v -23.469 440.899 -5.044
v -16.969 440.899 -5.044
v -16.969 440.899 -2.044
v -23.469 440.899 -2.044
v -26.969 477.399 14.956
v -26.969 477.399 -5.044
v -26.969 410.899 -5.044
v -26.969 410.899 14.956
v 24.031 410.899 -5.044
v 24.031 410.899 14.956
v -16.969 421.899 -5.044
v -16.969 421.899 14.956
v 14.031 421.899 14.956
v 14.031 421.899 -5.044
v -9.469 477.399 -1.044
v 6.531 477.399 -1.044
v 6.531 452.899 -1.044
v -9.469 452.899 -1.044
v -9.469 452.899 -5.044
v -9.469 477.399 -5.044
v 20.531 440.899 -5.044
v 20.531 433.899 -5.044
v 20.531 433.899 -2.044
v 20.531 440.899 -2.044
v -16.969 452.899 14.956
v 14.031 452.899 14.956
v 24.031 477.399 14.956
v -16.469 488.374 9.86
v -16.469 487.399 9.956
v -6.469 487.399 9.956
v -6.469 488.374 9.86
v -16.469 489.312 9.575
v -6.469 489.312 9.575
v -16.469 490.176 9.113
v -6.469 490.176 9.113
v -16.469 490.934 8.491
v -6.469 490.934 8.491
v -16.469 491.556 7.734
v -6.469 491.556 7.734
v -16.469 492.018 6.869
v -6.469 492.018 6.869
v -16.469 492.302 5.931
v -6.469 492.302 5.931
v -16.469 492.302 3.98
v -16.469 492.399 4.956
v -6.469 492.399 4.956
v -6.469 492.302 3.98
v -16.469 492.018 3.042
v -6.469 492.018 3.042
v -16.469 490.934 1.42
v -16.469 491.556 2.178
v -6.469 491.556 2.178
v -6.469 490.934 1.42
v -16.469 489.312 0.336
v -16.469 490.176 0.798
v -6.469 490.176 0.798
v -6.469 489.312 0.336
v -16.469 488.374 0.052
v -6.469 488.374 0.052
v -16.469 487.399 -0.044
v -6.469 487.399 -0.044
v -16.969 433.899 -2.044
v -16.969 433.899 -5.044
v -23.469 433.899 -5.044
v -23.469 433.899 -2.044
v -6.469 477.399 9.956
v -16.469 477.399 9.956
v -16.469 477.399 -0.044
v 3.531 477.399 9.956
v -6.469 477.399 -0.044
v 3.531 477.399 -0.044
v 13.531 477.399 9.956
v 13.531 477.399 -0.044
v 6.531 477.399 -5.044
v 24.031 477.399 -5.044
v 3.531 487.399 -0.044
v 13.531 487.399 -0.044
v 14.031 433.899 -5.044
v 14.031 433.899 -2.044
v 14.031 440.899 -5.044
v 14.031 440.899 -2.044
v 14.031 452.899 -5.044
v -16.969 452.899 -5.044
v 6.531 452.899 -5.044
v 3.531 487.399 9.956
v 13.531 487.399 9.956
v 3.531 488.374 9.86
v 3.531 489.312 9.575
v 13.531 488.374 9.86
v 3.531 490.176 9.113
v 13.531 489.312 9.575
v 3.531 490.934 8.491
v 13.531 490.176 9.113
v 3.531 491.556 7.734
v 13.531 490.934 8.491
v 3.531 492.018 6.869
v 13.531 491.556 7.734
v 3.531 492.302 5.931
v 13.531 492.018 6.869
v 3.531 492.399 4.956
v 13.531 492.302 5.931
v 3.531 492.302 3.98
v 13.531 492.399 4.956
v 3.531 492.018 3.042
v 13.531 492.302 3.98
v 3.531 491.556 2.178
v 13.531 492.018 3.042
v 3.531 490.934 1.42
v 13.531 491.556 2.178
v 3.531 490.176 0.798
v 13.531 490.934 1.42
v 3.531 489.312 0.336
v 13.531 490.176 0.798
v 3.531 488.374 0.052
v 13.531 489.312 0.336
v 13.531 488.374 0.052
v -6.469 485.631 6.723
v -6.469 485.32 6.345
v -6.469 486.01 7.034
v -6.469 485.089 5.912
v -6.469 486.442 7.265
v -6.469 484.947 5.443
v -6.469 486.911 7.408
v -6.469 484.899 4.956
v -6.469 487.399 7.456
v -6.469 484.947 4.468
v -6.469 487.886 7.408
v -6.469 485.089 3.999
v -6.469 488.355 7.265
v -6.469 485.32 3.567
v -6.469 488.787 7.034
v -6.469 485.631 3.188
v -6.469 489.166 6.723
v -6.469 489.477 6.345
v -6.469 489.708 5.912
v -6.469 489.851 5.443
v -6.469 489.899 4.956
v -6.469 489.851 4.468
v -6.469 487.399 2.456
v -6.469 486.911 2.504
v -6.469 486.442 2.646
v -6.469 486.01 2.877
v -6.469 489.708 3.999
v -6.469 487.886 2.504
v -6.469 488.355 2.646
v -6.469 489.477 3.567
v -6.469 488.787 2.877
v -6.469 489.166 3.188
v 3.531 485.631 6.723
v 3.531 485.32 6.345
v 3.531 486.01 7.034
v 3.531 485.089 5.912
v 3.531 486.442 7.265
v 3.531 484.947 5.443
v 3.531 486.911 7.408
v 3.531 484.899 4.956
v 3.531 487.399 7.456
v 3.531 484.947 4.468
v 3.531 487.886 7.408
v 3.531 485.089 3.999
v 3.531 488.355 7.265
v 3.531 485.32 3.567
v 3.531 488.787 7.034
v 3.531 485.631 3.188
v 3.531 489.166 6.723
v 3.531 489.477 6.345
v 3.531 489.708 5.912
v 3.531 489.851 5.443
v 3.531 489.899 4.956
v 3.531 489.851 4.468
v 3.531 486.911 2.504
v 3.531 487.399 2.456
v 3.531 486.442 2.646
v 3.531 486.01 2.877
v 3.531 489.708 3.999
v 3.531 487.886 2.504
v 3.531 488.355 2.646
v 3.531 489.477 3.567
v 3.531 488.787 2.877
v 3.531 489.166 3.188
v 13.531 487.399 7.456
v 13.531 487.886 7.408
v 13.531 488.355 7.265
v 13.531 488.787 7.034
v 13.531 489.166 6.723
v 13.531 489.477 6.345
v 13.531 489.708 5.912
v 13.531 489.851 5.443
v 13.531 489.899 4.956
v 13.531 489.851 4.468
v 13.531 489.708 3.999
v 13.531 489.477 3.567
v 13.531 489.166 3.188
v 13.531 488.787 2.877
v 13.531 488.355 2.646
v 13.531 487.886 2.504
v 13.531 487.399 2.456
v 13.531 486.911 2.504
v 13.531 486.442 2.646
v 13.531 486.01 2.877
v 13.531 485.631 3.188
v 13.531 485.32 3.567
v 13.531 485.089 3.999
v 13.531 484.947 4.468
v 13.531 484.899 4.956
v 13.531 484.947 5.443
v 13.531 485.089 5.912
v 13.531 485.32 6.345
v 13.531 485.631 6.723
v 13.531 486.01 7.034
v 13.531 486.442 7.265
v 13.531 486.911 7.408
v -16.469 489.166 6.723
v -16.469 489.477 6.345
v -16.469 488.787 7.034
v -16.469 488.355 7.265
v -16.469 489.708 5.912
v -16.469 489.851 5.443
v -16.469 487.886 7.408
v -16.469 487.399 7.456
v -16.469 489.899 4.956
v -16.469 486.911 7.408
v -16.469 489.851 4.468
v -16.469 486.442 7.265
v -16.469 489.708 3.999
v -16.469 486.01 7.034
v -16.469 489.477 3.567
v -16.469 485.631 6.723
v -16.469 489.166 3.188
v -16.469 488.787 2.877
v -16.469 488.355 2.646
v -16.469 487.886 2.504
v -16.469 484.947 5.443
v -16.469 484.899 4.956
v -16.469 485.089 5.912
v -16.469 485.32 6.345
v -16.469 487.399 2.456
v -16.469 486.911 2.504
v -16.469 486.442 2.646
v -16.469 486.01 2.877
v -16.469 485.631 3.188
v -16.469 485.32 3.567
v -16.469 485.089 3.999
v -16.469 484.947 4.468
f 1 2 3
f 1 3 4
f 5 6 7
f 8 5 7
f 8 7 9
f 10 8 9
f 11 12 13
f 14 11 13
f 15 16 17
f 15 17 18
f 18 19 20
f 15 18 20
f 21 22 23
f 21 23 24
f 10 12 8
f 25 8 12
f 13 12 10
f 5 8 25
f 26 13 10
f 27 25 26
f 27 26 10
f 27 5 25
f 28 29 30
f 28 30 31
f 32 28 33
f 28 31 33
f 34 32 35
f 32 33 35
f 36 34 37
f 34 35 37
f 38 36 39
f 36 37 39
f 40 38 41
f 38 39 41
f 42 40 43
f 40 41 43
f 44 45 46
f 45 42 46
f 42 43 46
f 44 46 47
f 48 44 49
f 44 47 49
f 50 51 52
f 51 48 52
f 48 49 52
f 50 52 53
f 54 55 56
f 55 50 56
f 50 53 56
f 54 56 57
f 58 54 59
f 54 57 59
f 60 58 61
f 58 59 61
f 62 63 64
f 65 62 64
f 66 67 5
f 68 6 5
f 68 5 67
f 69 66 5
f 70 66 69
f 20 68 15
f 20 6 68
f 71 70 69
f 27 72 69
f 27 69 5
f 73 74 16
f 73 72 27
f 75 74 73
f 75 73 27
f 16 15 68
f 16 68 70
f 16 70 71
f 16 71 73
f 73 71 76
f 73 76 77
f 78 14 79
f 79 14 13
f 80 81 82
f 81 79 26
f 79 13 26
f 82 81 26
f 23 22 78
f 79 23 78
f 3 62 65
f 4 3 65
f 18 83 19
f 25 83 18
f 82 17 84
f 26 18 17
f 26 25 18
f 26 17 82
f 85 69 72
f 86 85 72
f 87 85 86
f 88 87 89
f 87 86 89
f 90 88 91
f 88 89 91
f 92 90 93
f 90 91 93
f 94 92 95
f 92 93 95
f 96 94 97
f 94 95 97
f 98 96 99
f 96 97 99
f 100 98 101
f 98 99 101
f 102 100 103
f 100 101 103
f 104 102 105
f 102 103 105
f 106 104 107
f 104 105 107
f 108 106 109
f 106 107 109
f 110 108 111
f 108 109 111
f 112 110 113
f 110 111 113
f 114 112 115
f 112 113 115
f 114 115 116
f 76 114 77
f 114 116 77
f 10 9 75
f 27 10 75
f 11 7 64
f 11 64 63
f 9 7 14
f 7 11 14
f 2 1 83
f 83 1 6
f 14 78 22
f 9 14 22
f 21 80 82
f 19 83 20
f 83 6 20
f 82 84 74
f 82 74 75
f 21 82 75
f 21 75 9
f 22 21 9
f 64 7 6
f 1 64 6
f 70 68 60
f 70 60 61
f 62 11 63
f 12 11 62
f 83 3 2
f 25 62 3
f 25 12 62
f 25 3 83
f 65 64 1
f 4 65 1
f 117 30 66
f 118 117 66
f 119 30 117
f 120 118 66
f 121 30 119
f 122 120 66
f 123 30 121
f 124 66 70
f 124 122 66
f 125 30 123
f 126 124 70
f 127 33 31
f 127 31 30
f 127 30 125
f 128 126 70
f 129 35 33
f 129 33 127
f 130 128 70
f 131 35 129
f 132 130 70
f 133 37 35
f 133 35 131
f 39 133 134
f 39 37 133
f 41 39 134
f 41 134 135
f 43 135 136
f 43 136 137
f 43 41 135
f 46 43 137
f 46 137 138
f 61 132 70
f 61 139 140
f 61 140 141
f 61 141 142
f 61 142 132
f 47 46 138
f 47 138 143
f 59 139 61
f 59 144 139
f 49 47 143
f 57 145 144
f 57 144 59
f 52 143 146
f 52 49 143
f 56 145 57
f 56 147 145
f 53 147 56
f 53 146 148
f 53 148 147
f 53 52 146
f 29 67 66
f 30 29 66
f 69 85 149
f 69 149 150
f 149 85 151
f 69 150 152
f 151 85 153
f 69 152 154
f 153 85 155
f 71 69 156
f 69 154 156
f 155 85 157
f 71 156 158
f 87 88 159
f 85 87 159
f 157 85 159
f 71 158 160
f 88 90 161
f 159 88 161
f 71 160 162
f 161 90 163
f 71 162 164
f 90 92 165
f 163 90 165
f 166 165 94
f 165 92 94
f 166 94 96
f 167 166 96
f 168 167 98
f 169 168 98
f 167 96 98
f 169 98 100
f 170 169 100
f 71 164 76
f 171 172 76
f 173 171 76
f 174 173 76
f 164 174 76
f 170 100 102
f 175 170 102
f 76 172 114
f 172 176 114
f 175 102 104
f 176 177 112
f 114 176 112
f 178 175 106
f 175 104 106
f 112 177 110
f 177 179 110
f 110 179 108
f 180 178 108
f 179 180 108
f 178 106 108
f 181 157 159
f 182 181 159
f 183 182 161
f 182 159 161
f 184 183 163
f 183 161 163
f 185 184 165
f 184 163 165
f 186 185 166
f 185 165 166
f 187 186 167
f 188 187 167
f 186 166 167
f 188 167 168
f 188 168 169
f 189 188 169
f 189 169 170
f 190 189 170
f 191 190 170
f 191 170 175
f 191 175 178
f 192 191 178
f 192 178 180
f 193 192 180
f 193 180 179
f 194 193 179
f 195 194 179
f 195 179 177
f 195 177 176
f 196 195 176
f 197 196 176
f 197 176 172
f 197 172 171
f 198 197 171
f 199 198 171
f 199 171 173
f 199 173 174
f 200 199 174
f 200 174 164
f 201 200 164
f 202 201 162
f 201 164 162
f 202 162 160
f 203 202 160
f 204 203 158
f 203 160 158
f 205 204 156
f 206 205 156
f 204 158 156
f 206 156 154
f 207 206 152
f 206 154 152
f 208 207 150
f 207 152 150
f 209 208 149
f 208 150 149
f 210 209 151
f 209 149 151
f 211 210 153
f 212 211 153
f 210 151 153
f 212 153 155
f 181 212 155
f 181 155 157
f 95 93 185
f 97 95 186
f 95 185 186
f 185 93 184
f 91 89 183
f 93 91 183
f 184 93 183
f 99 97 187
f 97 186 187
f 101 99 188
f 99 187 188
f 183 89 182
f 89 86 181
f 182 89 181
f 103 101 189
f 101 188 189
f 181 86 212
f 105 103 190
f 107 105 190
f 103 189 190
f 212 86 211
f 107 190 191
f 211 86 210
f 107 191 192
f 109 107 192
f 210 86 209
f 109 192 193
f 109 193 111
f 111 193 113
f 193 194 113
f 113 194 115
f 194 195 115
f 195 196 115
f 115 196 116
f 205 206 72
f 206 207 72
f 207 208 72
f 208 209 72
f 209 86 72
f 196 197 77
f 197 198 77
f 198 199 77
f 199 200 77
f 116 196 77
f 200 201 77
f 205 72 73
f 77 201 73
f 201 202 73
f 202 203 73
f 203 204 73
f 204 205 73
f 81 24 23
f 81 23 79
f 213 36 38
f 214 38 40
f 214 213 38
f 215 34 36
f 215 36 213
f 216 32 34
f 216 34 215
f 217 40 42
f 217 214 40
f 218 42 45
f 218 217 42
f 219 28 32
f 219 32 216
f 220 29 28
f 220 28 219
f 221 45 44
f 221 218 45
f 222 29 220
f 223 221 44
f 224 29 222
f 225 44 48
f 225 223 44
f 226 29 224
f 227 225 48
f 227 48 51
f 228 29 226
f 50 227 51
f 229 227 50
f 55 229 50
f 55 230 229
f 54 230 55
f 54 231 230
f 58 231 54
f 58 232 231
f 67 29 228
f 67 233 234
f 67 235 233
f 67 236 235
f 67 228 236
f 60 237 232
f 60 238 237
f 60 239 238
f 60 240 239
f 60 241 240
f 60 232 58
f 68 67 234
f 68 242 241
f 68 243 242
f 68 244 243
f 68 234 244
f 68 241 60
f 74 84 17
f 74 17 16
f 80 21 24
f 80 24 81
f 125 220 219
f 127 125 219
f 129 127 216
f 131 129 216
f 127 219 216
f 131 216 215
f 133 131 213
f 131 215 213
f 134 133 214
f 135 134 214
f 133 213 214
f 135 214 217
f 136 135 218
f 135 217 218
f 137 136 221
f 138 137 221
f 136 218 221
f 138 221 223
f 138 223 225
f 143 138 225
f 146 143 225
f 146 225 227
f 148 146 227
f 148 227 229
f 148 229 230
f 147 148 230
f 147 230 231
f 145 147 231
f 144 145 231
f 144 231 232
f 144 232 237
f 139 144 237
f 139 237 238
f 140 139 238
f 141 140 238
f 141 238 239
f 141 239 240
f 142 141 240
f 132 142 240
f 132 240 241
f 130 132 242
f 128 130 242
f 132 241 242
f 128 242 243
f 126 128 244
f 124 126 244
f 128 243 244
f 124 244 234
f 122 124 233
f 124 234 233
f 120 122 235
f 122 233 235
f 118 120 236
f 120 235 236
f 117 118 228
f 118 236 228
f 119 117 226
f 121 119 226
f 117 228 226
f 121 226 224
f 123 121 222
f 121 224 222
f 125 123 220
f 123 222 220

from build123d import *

# Parameters (mm, degrees)
SKETCH1_W           = 50
SKETCH1_H           = 40
BOSS_EXTRUDE1_DEPTH = 10
SKETCH5_W           = 6
SKETCH5_H           = 5
BOSS_EXTRUDE3_DEPTH = 10
SKETCH6_R           = 2
CUT_EXTRUDE1_DEPTH  = 20
SKETCH8_W           = 10
SKETCH8_H           = 40
CUT_EXTRUDE2_DEPTH  = 25
SKETCH9_W           = 10
SKETCH9_H           = 6
SKETCH9_R           = 1.930897171
BOSS_EXTRUDE4_DEPTH = 5
SKETCH10_W          = 10
SKETCH10_H          = 5
CUT_EXTRUDE3_DEPTH  = 15
SKETCH11_W          = 5
SKETCH11_H          = 5
BOSS_EXTRUDE5_DEPTH = 10
SKETCH12_R          = 1.5
CUT_EXTRUDE4_DEPTH  = 10
SKETCH13_W          = 6
SKETCH13_H          = 5
CUT_EXTRUDE5_DEPTH  = 10
SKETCH15_W          = 5
SKETCH15_H          = 5
BOSS_EXTRUDE7_DEPTH = 10
SKETCH18_W          = 5
SKETCH18_H          = 5
CUT_EXTRUDE7_DEPTH  = 10
SKETCH19_R          = 1.25
CUT_EXTRUDE8_DEPTH  = 43
CUT_EXTRUDE9_DEPTH  = 20
SKETCH21_W          = 15.5
SKETCH21_H          = 15.5
CUT_EXTRUDE10_DEPTH = 30
SKETCH22_W          = 8
SKETCH22_H          = 12.25
CUT_EXTRUDE11_DEPTH = 2
SCALE2_SCALE        = 2
CUT_EXTRUDE12_DEPTH = 30
SKETCH24_W          = 44
SKETCH24_H          = 7
CUT_EXTRUDE13_DEPTH = 3


with BuildPart() as part:
    # Sketch1 → Boss-Extrude1 (new body)
    with BuildSketch(Plane(origin=(669.84184187, 0, 0), x_dir=(1, 0, 0), z_dir=(0, 0, 1))):
        with Locations((-671.310344828, 437.637931034)):
            Rectangle(SKETCH1_W, SKETCH1_H)
    boss_extrude1 = extrude(amount=BOSS_EXTRUDE1_DEPTH)

    # Sketch5 → Boss-Extrude3 (add)
    with BuildSketch(Plane(origin=(23.531497042, 0, 0), x_dir=(0, 0, -1), z_dir=(1, 0, 0))):
        with Locations((-5, 442.637931034)):
            Rectangle(SKETCH5_W, SKETCH5_H)
        with Locations((-5, 432.637931034)):
            Rectangle(SKETCH5_W, SKETCH5_H)
    extrude(amount=BOSS_EXTRUDE3_DEPTH)

    # Sketch6 → Cut-Extrude1 (cut)
    with BuildSketch(Plane(origin=(669.84184187, 445.137931034, 0), x_dir=(1, 0, 0), z_dir=(0, 1, 0))):
        with Locations(Location((-641.310344828, -5, 0), (0, 0, 180))):
            Circle(SKETCH6_R)
    extrude(amount=-CUT_EXTRUDE1_DEPTH, mode=Mode.SUBTRACT)

    # Sketch8 → Cut-Extrude2 (cut)
    with BuildSketch(Plane.ZY.offset(26.468502958)):
        with Locations((5, 437.637931034)):
            Rectangle(SKETCH8_W, SKETCH8_H)
    extrude(amount=-CUT_EXTRUDE2_DEPTH, mode=Mode.SUBTRACT)

    # Sketch9 → Boss-Extrude4 (add)
    with BuildSketch(Plane(origin=(0, 435.137931034, 0), x_dir=(1, 0, 0), z_dir=(0, 1, 0))):
        with Locations((28.531497042, -5)):
            Rectangle(SKETCH9_W, SKETCH9_H)
        with Locations(Location((28.531497042, -5, 0), (0, 0, 180))):
            Circle(SKETCH9_R, mode=Mode.SUBTRACT)
    extrude(amount=BOSS_EXTRUDE4_DEPTH)

    # Sketch10 → Cut-Extrude3 (cut)
    with BuildSketch(Plane.XY.offset(8)):
        with Locations((28.531497042, 432.637931034)):
            Rectangle(SKETCH10_W, SKETCH10_H)
        with Locations((28.531497042, 442.637931034)):
            Rectangle(SKETCH10_W, SKETCH10_H)
    extrude(amount=-CUT_EXTRUDE3_DEPTH, mode=Mode.SUBTRACT)

    # Mirror1: Boss-Extrude1 across plane
    add(boss_extrude1.mirror(Plane(origin=(-1.468502958, 0, 0), x_dir=(0, 0, 1), z_dir=(1, 0, 0))))

    # Sketch11 → Boss-Extrude5 (add)
    with BuildSketch(Plane(origin=(0, 457.637931034, 0), x_dir=(1, 0, 0), z_dir=(0, 1, 0))):
        with Locations((-1.468502958, -5)):
            Rectangle(SKETCH11_W, SKETCH11_H)
    extrude(amount=BOSS_EXTRUDE5_DEPTH)

    # Sketch12 → Cut-Extrude4 (cut)
    with BuildSketch(Plane(origin=(1.031497042, 0, 0), x_dir=(0, 0, -1), z_dir=(1, 0, 0))):
        with Locations((-5, 462.637931034)):
            Circle(SKETCH12_R)
    extrude(amount=-CUT_EXTRUDE4_DEPTH, mode=Mode.SUBTRACT)

    # Sketch13 → Cut-Extrude5 (cut)
    with BuildSketch(Plane(origin=(33.531497042, 0, 0), x_dir=(0, 0, -1), z_dir=(1, 0, 0))):
        with Locations((-5, 437.637931034)):
            Rectangle(SKETCH13_W, SKETCH13_H)
    extrude(amount=-CUT_EXTRUDE5_DEPTH, mode=Mode.SUBTRACT)

    # Sketch15 → Boss-Extrude7 (add)
    with BuildSketch(Plane(origin=(0, 457.637931034, 0), x_dir=(1, 0, 0), z_dir=(0, 1, 0))):
        with Locations((-6.468502958, -5)):
            Rectangle(SKETCH15_W, SKETCH15_H)
        with Locations((3.531497042, -5)):
            Rectangle(SKETCH15_W, SKETCH15_H)
    extrude(amount=BOSS_EXTRUDE7_DEPTH)

    # Sketch18 → Cut-Extrude7 (cut)
    with BuildSketch(Plane(origin=(0, 467.637931034, 0), x_dir=(1, 0, 0), z_dir=(0, 1, 0))):
        with Locations((-1.468502958, -5)):
            Rectangle(SKETCH18_W, SKETCH18_H)
    extrude(amount=-CUT_EXTRUDE7_DEPTH, mode=Mode.SUBTRACT)

    # Sketch19 → Cut-Extrude8 (cut)
    with BuildSketch(Plane.ZY.offset(8.968502958)):
        with Locations((5, 462.637931034)):
            Circle(SKETCH19_R)
    extrude(amount=-CUT_EXTRUDE8_DEPTH, mode=Mode.SUBTRACT)

    # Sketch20 → Cut-Extrude9 (cut)
    with BuildSketch(Plane(origin=(6.031497042, 0, 0), x_dir=(0, 0, -1), z_dir=(1, 0, 0))):
        with BuildLine():
            Line((-7.5, 467.637931034), (-7.5, 462.637931034))
            ThreePointArc((-7.5, 462.637931034), (-5, 465.137931034), (-2.5, 462.637931034))
            Line((-2.5, 462.637931034), (-2.5, 467.637931034))
            Line((-2.5, 467.637931034), (-7.5, 467.637931034))
        make_face()
    extrude(amount=-CUT_EXTRUDE9_DEPTH, mode=Mode.SUBTRACT)

    # Sketch21 → Cut-Extrude10 (cut)
    with BuildSketch(Plane.XY.offset(10)):
        with Locations((-1.468502958, 437.637931034)):
            Rectangle(SKETCH21_W, SKETCH21_H)
    extrude(amount=-CUT_EXTRUDE10_DEPTH, mode=Mode.SUBTRACT)

    # Sketch22 → Cut-Extrude11 (cut)
    with BuildSketch(Plane(origin=(0, 0, 0), x_dir=(-1, 0, 0), z_dir=(0, 0, -1))):
        with Locations((1.468502958, 451.512931034)):
            Rectangle(SKETCH22_W, SKETCH22_H)
    extrude(amount=-CUT_EXTRUDE11_DEPTH, mode=Mode.SUBTRACT)


with BuildPart() as part_1:
    # Scale2: scaled about (-1.468502958, 437.877293221, 5.044292315)
    add(part.part.scale(SCALE2_SCALE).moved(Location((1.468502958, -437.877293221, -5.044292315))))

    # Sketch23 → Cut-Extrude12 (cut)
    with BuildSketch(Plane(origin=(0, 0, -5.044292315), x_dir=(-1, 0, 0), z_dir=(0, 0, -1))):
        Polygon((26.968502958, 495.287404552), (26.968502958, 477.398568848), (51.468502958, 477.398568848), (51.468502958, 397.398568848), (-48.531497042, 397.398568848), (-48.531497042, 477.398568848), (-24.031497042, 477.398568848), (-24.031497042, 495.287404552), (-71.530370383, 495.287404552), (-71.530370383, 371.111775085), (85.960671869, 371.111775085), (85.960671869, 495.287404552), align=None)
        Polygon((51.468502958, 477.398568848), (26.968502958, 477.398568848), (26.968502958, 410.898568848), (-24.031497042, 410.898568848), (-24.031497042, 477.398568848), (-48.531497042, 477.398568848), (-48.531497042, 397.398568848), (51.468502958, 397.398568848), align=None)
    extrude(amount=-CUT_EXTRUDE12_DEPTH, mode=Mode.SUBTRACT)

    # Sketch24 → Cut-Extrude13 (cut)
    with BuildSketch(Plane(origin=(0, 0, -5.044292315), x_dir=(-1, 0, 0), z_dir=(0, 0, -1))):
        with Locations((1.468502958, 437.398568848)):
            Rectangle(SKETCH24_W, SKETCH24_H)
    extrude(amount=-CUT_EXTRUDE13_DEPTH, mode=Mode.SUBTRACT)


solid = part_1.part
